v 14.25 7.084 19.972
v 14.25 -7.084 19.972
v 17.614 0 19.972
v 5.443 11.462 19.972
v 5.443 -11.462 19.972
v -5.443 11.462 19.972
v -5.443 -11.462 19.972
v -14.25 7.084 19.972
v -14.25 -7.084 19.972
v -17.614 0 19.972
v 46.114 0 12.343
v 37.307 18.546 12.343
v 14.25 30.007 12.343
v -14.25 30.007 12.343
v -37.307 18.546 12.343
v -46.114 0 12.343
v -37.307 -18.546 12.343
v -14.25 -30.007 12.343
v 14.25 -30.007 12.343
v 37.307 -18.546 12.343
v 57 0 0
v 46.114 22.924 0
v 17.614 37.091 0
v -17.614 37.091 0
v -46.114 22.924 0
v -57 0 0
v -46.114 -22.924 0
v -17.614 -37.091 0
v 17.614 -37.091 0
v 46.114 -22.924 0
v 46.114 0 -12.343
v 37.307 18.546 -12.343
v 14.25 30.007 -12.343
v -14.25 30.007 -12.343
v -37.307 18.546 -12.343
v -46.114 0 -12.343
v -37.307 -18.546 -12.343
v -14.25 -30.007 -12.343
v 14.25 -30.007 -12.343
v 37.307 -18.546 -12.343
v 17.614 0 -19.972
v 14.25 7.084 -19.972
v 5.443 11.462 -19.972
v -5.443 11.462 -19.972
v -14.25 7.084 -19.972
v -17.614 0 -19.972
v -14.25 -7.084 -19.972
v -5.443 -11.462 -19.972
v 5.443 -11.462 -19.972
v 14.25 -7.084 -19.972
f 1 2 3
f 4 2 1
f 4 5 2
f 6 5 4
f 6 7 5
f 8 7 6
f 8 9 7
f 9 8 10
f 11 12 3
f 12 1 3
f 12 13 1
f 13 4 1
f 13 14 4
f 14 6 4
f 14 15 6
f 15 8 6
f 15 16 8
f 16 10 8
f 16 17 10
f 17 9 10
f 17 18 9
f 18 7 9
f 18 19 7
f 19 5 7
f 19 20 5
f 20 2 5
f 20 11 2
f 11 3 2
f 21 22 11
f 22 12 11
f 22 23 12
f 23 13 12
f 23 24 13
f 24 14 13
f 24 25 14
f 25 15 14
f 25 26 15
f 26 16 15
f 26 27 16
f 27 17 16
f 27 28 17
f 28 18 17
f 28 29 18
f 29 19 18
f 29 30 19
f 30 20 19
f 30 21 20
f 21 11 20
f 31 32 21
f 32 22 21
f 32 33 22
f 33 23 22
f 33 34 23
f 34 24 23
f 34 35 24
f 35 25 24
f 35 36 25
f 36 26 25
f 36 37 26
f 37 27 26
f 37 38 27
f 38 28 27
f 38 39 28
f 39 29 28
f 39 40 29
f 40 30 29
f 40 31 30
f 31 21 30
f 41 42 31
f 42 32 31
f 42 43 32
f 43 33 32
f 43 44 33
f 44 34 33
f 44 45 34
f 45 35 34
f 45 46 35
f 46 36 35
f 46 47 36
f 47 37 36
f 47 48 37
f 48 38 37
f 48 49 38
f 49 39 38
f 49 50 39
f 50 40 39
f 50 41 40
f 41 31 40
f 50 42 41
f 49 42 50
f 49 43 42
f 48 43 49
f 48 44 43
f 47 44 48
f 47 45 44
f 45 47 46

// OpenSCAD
// Generated by SolidPython 1.0.1 on 2020-07-29 00:46:54


scale(v = [19, 13, 7]) {
	sphere(r = 3);
}
/***********************************************
*********      SolidPython code:      **********
************************************************
 
# import packages: SolidPython
from solid import *
from solid.utils import *
from itertools import chain, combinations, permutations


class Resize:

    def __init__(self, scad_file):
        self.scad_file = scad_file
        #self.scad_file = import_scad(scad_file)
        # cone/cylinder param:
        self.r1 = 0
        self.r2 = 0
        self.h = 0
        # rectangular prism param:
        self.w = 0
        self.l = 0
        # ellipse param:
        self.r = 0

    # import OpenScad code (file name corresponds to shape)


    # classify shape + parameters
    def assign(self, param1, param2, param3):
        if self.scad_file == 'cone.scad':
            self.r1 = param1
            self.r2 = param2
            self.h = param3
        elif self.scad_file == 'cylinder.scad':
            self.r1 = param1
            self.r2 = param2
            self.h = param3
        elif self.scad_file == 'rectangularPrism.scad':
            self.h = param1
            self.l = param2
            self.w = param3
        else:
            self.r = param1
            self.h = param2

    # resize parameters
    def iterate(self):
        x = range(3, 20, 2)
        i = 1
        if self.scad_file == 'cone.scad':
            tempList = list(permutations(x, 2))
            for temp in tempList:
                param1 = temp[0]
                param2 = temp[1]
                filepath = 'produced_scad_files/' + 'cone' + str(param1) + '_' + str(param2) + '_' + '.scad'
                scad_render_to_file(cylinder(h=param1, r1=param2, r2=0), filepath)

        elif self.scad_file == 'cylinder.scad':
            tempList = list(permutations(x, 3))
            for temp in tempList:
                param1 = temp[0]
                param2 = temp[1]
                filepath = 'produced_scad_files/' + 'cylinder' + str(param1) + '_' + str(param2) + '_' + '.scad'
                scad_render_to_file(cylinder(h=param1, r1=param2, r2=param2), filepath)

        elif self.scad_file == 'rectangularPrism.scad':
            tempList = list(permutations(x, 3))
            for temp in tempList:
                param1 = temp[0]
                param2 = temp[1]
                param3 = temp[2]
                filepath = 'produced_scad_files/' + 'rectangularPrism' + str(param1) + '_' + str(param2) + '_' + str(
                    param3) + '.scad'
                scad_render_to_file(cube(size=(param1, param2, param3)), filepath)

        elif self.scad_file == 'ellipse.scad':
            tempList = list(permutations(x, 4))
            for temp in tempList:
                param1 = temp[0]
                param2 = temp[1]
                param3 = temp[2]
                param4 = temp[3]
                filepath = 'produced_scad_files/' + 'ellipse' + str(param1) + '_' + str(param2) + '_' + str(param3) + '_' + str(param4) + '.scad'
                scad_render_to_file(scale([param1, param2, param3])(sphere(r=param4)), filepath)

    def render_to_scadfile(self):
        scad_render_to_file(scad, 'example.scad') 
 
************************************************/
